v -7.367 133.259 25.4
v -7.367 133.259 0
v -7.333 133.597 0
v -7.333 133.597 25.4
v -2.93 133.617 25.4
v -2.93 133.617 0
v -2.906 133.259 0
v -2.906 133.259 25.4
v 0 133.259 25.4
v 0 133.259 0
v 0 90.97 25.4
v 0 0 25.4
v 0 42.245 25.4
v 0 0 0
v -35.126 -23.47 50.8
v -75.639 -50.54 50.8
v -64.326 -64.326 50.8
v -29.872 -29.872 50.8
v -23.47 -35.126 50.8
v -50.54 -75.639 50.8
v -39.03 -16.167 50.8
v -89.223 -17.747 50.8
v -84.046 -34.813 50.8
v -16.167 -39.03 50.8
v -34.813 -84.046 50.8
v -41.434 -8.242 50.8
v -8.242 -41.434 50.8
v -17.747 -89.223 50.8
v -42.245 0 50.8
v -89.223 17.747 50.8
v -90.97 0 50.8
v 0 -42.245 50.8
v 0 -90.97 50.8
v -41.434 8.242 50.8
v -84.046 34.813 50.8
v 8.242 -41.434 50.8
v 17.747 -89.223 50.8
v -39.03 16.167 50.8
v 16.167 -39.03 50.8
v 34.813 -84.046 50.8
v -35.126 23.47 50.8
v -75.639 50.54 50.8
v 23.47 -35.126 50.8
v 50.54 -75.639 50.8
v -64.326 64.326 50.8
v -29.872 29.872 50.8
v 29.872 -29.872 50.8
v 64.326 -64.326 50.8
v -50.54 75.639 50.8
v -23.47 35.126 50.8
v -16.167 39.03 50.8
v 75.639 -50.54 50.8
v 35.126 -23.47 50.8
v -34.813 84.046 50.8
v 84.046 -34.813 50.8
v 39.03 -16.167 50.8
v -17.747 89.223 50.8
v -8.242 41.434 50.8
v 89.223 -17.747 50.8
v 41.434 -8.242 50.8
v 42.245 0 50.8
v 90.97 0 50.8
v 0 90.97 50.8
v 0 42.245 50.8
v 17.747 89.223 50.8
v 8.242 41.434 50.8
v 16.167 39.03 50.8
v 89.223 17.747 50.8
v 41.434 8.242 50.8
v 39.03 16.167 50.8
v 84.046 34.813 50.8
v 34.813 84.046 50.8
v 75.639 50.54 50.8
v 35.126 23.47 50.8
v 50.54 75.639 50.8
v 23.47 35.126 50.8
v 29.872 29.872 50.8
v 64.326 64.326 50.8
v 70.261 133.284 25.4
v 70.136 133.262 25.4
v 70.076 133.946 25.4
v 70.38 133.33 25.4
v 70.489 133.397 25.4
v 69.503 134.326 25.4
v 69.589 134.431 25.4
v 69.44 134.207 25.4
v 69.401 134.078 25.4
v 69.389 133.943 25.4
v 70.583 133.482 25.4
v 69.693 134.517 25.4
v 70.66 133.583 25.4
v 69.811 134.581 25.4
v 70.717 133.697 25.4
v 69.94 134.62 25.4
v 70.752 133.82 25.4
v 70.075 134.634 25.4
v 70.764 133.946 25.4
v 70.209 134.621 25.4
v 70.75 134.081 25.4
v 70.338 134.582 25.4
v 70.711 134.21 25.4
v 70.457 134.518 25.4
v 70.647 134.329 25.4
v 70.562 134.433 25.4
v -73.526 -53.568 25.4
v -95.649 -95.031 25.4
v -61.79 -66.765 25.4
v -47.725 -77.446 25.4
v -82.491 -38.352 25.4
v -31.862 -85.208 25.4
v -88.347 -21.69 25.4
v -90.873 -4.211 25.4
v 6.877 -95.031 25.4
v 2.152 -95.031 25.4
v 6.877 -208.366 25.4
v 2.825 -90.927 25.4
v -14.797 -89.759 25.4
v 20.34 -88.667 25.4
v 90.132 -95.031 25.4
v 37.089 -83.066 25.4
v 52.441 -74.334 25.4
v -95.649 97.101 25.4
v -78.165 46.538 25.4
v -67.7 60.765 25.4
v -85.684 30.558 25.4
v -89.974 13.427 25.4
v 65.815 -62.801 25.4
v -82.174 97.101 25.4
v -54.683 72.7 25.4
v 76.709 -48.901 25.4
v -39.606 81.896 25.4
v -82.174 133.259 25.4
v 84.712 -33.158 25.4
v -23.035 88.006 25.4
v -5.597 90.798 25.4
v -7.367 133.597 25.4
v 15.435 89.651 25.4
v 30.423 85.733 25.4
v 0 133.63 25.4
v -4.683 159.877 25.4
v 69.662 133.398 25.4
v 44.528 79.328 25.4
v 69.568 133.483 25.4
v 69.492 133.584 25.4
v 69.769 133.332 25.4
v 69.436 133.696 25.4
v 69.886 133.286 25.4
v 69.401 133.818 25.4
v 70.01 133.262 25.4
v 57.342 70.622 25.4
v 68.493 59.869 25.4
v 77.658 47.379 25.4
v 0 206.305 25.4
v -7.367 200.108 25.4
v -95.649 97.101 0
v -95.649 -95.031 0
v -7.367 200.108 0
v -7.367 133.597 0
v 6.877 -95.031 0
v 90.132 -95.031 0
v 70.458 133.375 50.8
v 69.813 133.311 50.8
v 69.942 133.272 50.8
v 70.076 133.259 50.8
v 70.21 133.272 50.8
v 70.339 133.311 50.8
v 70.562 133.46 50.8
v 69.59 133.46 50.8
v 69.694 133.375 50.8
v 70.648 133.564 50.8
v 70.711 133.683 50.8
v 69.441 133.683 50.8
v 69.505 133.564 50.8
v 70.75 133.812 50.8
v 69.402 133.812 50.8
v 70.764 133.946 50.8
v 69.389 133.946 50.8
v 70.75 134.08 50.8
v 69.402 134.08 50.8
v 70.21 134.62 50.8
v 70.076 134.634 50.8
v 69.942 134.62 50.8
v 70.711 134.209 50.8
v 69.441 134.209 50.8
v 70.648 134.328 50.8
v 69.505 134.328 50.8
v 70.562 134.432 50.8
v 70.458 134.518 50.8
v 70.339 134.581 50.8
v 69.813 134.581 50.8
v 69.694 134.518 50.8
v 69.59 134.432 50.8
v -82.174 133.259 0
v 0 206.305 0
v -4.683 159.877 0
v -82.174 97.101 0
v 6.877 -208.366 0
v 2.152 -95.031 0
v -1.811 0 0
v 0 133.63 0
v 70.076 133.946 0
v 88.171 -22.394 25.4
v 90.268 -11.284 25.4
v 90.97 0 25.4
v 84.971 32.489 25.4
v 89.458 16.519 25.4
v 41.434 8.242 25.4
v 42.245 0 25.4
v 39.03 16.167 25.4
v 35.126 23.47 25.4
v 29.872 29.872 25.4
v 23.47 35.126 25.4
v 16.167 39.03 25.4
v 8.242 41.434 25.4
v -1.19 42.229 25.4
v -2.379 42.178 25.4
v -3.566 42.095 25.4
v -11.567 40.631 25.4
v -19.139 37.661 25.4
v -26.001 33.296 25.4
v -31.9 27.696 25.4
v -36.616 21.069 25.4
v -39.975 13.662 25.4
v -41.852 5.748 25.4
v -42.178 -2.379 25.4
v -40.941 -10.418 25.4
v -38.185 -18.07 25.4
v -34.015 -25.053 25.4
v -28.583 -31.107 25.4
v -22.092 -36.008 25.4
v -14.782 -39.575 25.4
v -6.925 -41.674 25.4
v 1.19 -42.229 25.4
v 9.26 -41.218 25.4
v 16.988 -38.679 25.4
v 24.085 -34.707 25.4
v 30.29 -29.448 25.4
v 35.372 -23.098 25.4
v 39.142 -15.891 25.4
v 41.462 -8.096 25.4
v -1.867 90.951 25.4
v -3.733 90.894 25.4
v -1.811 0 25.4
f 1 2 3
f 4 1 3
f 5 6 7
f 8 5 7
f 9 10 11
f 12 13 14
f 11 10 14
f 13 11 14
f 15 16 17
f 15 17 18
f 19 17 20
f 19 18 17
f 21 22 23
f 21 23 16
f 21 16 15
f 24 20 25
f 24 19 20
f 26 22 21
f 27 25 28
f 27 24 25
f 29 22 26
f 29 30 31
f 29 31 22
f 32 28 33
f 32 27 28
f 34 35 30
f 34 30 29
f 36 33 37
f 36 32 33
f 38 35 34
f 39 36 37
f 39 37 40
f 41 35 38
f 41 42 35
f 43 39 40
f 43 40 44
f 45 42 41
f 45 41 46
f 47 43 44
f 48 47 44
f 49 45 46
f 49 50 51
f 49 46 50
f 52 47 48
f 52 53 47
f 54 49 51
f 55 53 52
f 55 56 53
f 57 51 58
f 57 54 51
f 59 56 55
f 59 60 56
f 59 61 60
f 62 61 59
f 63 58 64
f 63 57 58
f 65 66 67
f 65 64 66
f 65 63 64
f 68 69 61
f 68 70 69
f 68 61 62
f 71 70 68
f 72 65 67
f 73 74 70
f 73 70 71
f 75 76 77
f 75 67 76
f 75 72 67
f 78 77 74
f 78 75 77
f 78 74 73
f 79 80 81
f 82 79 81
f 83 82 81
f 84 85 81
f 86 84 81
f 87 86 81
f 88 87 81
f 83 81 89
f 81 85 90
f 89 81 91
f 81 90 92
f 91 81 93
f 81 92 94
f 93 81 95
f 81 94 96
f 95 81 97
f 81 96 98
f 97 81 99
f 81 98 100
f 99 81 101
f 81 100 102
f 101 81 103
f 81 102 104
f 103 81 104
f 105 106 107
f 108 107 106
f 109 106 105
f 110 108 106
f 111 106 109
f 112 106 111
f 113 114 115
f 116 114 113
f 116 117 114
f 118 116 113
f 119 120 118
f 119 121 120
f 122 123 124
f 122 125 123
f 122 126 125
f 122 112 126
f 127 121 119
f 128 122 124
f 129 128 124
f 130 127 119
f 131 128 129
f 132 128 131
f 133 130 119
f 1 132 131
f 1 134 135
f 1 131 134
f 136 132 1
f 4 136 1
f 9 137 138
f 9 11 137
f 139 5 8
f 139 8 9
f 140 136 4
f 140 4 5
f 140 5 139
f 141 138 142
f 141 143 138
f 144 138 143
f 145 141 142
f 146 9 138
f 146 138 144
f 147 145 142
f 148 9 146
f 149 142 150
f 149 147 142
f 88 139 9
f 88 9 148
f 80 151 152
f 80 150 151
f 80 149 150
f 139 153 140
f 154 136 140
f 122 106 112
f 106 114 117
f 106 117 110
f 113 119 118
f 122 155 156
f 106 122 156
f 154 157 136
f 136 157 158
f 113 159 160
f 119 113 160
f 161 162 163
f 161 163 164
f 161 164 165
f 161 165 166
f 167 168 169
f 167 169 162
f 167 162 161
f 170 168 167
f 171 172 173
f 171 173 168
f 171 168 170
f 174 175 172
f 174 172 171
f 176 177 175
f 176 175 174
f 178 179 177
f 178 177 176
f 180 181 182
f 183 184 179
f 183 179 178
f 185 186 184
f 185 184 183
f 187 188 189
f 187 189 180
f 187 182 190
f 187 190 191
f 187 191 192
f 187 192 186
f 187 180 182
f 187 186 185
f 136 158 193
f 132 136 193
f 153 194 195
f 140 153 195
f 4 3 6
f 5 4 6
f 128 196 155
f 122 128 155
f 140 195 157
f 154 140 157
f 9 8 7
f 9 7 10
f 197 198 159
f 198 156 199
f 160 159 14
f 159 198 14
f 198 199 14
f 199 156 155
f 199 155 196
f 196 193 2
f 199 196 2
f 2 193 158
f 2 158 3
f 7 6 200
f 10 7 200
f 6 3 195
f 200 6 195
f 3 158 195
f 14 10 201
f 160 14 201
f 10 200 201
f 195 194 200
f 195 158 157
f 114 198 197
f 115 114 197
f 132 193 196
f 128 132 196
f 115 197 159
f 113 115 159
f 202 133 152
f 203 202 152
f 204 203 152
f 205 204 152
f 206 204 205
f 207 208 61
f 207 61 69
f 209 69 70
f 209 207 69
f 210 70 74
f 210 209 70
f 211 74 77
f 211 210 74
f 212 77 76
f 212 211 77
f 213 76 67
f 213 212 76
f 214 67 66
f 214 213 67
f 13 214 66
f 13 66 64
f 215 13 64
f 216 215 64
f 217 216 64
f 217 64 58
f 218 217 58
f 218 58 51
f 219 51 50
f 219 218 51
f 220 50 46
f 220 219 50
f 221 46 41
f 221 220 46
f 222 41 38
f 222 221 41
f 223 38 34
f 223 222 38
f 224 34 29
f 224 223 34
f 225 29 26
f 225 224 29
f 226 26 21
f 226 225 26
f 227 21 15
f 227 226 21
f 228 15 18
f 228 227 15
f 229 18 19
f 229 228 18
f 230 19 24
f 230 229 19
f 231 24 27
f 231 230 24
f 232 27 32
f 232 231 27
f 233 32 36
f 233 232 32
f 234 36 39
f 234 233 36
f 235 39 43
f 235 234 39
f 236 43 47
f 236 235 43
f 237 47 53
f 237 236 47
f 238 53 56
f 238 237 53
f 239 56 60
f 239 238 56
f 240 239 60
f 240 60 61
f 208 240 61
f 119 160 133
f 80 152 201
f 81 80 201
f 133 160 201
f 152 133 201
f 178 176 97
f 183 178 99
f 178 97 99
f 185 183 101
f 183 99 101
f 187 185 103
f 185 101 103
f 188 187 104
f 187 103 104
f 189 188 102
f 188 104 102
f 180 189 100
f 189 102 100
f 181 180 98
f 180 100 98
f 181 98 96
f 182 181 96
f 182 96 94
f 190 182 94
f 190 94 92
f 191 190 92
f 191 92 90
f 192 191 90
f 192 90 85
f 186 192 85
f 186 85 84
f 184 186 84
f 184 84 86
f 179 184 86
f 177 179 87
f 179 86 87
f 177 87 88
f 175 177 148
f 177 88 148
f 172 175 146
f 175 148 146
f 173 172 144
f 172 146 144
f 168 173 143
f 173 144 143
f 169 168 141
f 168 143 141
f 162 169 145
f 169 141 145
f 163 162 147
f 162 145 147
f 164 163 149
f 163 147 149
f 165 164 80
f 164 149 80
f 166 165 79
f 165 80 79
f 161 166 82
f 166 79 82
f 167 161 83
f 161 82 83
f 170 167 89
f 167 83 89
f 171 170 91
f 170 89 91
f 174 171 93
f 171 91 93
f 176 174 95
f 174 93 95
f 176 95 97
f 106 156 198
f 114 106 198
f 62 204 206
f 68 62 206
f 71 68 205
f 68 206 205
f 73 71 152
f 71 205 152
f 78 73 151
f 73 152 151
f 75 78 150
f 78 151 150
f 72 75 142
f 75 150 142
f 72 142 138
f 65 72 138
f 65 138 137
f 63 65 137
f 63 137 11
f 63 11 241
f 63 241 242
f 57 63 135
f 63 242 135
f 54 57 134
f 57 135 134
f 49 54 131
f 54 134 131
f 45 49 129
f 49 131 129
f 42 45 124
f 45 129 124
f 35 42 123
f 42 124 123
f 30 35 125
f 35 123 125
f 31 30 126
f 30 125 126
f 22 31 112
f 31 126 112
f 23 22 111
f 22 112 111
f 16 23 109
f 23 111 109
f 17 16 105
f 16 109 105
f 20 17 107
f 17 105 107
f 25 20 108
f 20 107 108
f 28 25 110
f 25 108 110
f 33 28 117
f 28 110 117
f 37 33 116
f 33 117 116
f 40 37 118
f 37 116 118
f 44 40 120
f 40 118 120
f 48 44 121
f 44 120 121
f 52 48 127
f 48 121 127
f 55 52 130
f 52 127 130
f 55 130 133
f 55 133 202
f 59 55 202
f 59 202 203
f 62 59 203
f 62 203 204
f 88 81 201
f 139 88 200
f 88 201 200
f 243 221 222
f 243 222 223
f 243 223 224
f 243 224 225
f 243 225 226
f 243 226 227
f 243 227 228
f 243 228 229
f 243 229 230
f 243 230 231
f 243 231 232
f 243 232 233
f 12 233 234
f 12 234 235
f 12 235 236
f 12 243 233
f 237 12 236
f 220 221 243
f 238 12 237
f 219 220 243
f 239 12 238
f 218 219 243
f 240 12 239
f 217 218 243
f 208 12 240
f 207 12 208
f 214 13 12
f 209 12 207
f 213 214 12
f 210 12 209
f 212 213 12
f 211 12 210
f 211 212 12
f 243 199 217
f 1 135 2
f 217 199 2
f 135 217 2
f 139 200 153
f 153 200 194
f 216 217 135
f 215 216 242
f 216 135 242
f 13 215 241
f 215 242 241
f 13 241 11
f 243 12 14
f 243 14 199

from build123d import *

# Parameters (mm, degrees)
F1_DEPTH = 25.4
F2_R     = 0.6873607635
F2_R_2   = 90.9704794281
F2_R_3   = 42.2453138018
F3_DEPTH = 25.4


with BuildPart() as f1:
    # F0 (on Top) → F1 (new body)
    with BuildSketch(Plane.XY):
        Polygon((0, 89.7069421623), (0, 0), (-1.810804775, 0), (2.1516823224, -95.0307697058), (6.8773888052, -95.0307697058), (6.8773888052, -13.3527815342), align=None)
        Polygon((2.1516823224, -95.0307697058), (-1.810804775, 0), (-95.6487208605, 0), (-95.6487208605, -95.0307697058), align=None)
        Polygon((-95.6487208605, 0), (-1.810804775, 0), (-5.859600791, 97.1006825566), (-82.1735113859, 97.1006825566), (-95.6487208605, 97.1006825566), align=None)
        Polygon((0, 97.1006825566), (0, 89.7069421623), (6.8773888052, -13.3527815342), (6.8773888052, -95.0307697058), (90.1318565011, -95.0307697058), (70.0762048364, 133.9463293552), (0, 133.6299567875), (0, 133.2589685917), align=None)
        Polygon((-82.1735113859, 97.1006825566), (-5.859600791, 97.1006825566), (-7.3672886938, 133.2589685917), (-82.1735113859, 133.2589685917), align=None)
        Polygon((6.8773888052, -95.0307697058), (2.1516823224, -95.0307697058), (6.8773888052, -208.3655297756), align=None)
        Polygon((-7.3672886938, 133.5966957391), (-7.3672886938, 133.2589685917), (-7.3332104262, 133.596849592), align=None)
        Polygon((-82.1735113859, 133.2589685917), (-7.3672886938, 133.2589685917), (-7.3672886938, 133.5966957391), align=None)
        Polygon((-2.9063169225, 133.2589685917), (0, 133.2589685917), (0, 133.6299567875), (-2.9301909404, 133.6167278743), align=None)
        Polygon((-7.3672886938, 133.5966957391), (-7.3332104262, 133.596849592), (-4.6826064537, 159.8771973232), (-7.3672886938, 200.1079618931), align=None)
        Polygon((-4.6826064537, 159.8771973232), (-7.3332104262, 133.596849592), (-2.9301909404, 133.6167278743), align=None)
        Polygon((-2.9301909404, 133.6167278743), (0, 133.6299567875), (0, 206.3045501709), (-4.6826064537, 159.8771973232), align=None)
    extrude(amount=F1_DEPTH)

    # F2 (on face) → F3 (join)
    with BuildSketch(Plane.XY.offset(25.4)):
        with Locations((70.0762048364, 133.9463293552)):
            Circle(F2_R)
        Circle(F2_R_2)
        Circle(F2_R_3, mode=Mode.SUBTRACT)
    extrude(amount=F3_DEPTH)


solid = f1.part
